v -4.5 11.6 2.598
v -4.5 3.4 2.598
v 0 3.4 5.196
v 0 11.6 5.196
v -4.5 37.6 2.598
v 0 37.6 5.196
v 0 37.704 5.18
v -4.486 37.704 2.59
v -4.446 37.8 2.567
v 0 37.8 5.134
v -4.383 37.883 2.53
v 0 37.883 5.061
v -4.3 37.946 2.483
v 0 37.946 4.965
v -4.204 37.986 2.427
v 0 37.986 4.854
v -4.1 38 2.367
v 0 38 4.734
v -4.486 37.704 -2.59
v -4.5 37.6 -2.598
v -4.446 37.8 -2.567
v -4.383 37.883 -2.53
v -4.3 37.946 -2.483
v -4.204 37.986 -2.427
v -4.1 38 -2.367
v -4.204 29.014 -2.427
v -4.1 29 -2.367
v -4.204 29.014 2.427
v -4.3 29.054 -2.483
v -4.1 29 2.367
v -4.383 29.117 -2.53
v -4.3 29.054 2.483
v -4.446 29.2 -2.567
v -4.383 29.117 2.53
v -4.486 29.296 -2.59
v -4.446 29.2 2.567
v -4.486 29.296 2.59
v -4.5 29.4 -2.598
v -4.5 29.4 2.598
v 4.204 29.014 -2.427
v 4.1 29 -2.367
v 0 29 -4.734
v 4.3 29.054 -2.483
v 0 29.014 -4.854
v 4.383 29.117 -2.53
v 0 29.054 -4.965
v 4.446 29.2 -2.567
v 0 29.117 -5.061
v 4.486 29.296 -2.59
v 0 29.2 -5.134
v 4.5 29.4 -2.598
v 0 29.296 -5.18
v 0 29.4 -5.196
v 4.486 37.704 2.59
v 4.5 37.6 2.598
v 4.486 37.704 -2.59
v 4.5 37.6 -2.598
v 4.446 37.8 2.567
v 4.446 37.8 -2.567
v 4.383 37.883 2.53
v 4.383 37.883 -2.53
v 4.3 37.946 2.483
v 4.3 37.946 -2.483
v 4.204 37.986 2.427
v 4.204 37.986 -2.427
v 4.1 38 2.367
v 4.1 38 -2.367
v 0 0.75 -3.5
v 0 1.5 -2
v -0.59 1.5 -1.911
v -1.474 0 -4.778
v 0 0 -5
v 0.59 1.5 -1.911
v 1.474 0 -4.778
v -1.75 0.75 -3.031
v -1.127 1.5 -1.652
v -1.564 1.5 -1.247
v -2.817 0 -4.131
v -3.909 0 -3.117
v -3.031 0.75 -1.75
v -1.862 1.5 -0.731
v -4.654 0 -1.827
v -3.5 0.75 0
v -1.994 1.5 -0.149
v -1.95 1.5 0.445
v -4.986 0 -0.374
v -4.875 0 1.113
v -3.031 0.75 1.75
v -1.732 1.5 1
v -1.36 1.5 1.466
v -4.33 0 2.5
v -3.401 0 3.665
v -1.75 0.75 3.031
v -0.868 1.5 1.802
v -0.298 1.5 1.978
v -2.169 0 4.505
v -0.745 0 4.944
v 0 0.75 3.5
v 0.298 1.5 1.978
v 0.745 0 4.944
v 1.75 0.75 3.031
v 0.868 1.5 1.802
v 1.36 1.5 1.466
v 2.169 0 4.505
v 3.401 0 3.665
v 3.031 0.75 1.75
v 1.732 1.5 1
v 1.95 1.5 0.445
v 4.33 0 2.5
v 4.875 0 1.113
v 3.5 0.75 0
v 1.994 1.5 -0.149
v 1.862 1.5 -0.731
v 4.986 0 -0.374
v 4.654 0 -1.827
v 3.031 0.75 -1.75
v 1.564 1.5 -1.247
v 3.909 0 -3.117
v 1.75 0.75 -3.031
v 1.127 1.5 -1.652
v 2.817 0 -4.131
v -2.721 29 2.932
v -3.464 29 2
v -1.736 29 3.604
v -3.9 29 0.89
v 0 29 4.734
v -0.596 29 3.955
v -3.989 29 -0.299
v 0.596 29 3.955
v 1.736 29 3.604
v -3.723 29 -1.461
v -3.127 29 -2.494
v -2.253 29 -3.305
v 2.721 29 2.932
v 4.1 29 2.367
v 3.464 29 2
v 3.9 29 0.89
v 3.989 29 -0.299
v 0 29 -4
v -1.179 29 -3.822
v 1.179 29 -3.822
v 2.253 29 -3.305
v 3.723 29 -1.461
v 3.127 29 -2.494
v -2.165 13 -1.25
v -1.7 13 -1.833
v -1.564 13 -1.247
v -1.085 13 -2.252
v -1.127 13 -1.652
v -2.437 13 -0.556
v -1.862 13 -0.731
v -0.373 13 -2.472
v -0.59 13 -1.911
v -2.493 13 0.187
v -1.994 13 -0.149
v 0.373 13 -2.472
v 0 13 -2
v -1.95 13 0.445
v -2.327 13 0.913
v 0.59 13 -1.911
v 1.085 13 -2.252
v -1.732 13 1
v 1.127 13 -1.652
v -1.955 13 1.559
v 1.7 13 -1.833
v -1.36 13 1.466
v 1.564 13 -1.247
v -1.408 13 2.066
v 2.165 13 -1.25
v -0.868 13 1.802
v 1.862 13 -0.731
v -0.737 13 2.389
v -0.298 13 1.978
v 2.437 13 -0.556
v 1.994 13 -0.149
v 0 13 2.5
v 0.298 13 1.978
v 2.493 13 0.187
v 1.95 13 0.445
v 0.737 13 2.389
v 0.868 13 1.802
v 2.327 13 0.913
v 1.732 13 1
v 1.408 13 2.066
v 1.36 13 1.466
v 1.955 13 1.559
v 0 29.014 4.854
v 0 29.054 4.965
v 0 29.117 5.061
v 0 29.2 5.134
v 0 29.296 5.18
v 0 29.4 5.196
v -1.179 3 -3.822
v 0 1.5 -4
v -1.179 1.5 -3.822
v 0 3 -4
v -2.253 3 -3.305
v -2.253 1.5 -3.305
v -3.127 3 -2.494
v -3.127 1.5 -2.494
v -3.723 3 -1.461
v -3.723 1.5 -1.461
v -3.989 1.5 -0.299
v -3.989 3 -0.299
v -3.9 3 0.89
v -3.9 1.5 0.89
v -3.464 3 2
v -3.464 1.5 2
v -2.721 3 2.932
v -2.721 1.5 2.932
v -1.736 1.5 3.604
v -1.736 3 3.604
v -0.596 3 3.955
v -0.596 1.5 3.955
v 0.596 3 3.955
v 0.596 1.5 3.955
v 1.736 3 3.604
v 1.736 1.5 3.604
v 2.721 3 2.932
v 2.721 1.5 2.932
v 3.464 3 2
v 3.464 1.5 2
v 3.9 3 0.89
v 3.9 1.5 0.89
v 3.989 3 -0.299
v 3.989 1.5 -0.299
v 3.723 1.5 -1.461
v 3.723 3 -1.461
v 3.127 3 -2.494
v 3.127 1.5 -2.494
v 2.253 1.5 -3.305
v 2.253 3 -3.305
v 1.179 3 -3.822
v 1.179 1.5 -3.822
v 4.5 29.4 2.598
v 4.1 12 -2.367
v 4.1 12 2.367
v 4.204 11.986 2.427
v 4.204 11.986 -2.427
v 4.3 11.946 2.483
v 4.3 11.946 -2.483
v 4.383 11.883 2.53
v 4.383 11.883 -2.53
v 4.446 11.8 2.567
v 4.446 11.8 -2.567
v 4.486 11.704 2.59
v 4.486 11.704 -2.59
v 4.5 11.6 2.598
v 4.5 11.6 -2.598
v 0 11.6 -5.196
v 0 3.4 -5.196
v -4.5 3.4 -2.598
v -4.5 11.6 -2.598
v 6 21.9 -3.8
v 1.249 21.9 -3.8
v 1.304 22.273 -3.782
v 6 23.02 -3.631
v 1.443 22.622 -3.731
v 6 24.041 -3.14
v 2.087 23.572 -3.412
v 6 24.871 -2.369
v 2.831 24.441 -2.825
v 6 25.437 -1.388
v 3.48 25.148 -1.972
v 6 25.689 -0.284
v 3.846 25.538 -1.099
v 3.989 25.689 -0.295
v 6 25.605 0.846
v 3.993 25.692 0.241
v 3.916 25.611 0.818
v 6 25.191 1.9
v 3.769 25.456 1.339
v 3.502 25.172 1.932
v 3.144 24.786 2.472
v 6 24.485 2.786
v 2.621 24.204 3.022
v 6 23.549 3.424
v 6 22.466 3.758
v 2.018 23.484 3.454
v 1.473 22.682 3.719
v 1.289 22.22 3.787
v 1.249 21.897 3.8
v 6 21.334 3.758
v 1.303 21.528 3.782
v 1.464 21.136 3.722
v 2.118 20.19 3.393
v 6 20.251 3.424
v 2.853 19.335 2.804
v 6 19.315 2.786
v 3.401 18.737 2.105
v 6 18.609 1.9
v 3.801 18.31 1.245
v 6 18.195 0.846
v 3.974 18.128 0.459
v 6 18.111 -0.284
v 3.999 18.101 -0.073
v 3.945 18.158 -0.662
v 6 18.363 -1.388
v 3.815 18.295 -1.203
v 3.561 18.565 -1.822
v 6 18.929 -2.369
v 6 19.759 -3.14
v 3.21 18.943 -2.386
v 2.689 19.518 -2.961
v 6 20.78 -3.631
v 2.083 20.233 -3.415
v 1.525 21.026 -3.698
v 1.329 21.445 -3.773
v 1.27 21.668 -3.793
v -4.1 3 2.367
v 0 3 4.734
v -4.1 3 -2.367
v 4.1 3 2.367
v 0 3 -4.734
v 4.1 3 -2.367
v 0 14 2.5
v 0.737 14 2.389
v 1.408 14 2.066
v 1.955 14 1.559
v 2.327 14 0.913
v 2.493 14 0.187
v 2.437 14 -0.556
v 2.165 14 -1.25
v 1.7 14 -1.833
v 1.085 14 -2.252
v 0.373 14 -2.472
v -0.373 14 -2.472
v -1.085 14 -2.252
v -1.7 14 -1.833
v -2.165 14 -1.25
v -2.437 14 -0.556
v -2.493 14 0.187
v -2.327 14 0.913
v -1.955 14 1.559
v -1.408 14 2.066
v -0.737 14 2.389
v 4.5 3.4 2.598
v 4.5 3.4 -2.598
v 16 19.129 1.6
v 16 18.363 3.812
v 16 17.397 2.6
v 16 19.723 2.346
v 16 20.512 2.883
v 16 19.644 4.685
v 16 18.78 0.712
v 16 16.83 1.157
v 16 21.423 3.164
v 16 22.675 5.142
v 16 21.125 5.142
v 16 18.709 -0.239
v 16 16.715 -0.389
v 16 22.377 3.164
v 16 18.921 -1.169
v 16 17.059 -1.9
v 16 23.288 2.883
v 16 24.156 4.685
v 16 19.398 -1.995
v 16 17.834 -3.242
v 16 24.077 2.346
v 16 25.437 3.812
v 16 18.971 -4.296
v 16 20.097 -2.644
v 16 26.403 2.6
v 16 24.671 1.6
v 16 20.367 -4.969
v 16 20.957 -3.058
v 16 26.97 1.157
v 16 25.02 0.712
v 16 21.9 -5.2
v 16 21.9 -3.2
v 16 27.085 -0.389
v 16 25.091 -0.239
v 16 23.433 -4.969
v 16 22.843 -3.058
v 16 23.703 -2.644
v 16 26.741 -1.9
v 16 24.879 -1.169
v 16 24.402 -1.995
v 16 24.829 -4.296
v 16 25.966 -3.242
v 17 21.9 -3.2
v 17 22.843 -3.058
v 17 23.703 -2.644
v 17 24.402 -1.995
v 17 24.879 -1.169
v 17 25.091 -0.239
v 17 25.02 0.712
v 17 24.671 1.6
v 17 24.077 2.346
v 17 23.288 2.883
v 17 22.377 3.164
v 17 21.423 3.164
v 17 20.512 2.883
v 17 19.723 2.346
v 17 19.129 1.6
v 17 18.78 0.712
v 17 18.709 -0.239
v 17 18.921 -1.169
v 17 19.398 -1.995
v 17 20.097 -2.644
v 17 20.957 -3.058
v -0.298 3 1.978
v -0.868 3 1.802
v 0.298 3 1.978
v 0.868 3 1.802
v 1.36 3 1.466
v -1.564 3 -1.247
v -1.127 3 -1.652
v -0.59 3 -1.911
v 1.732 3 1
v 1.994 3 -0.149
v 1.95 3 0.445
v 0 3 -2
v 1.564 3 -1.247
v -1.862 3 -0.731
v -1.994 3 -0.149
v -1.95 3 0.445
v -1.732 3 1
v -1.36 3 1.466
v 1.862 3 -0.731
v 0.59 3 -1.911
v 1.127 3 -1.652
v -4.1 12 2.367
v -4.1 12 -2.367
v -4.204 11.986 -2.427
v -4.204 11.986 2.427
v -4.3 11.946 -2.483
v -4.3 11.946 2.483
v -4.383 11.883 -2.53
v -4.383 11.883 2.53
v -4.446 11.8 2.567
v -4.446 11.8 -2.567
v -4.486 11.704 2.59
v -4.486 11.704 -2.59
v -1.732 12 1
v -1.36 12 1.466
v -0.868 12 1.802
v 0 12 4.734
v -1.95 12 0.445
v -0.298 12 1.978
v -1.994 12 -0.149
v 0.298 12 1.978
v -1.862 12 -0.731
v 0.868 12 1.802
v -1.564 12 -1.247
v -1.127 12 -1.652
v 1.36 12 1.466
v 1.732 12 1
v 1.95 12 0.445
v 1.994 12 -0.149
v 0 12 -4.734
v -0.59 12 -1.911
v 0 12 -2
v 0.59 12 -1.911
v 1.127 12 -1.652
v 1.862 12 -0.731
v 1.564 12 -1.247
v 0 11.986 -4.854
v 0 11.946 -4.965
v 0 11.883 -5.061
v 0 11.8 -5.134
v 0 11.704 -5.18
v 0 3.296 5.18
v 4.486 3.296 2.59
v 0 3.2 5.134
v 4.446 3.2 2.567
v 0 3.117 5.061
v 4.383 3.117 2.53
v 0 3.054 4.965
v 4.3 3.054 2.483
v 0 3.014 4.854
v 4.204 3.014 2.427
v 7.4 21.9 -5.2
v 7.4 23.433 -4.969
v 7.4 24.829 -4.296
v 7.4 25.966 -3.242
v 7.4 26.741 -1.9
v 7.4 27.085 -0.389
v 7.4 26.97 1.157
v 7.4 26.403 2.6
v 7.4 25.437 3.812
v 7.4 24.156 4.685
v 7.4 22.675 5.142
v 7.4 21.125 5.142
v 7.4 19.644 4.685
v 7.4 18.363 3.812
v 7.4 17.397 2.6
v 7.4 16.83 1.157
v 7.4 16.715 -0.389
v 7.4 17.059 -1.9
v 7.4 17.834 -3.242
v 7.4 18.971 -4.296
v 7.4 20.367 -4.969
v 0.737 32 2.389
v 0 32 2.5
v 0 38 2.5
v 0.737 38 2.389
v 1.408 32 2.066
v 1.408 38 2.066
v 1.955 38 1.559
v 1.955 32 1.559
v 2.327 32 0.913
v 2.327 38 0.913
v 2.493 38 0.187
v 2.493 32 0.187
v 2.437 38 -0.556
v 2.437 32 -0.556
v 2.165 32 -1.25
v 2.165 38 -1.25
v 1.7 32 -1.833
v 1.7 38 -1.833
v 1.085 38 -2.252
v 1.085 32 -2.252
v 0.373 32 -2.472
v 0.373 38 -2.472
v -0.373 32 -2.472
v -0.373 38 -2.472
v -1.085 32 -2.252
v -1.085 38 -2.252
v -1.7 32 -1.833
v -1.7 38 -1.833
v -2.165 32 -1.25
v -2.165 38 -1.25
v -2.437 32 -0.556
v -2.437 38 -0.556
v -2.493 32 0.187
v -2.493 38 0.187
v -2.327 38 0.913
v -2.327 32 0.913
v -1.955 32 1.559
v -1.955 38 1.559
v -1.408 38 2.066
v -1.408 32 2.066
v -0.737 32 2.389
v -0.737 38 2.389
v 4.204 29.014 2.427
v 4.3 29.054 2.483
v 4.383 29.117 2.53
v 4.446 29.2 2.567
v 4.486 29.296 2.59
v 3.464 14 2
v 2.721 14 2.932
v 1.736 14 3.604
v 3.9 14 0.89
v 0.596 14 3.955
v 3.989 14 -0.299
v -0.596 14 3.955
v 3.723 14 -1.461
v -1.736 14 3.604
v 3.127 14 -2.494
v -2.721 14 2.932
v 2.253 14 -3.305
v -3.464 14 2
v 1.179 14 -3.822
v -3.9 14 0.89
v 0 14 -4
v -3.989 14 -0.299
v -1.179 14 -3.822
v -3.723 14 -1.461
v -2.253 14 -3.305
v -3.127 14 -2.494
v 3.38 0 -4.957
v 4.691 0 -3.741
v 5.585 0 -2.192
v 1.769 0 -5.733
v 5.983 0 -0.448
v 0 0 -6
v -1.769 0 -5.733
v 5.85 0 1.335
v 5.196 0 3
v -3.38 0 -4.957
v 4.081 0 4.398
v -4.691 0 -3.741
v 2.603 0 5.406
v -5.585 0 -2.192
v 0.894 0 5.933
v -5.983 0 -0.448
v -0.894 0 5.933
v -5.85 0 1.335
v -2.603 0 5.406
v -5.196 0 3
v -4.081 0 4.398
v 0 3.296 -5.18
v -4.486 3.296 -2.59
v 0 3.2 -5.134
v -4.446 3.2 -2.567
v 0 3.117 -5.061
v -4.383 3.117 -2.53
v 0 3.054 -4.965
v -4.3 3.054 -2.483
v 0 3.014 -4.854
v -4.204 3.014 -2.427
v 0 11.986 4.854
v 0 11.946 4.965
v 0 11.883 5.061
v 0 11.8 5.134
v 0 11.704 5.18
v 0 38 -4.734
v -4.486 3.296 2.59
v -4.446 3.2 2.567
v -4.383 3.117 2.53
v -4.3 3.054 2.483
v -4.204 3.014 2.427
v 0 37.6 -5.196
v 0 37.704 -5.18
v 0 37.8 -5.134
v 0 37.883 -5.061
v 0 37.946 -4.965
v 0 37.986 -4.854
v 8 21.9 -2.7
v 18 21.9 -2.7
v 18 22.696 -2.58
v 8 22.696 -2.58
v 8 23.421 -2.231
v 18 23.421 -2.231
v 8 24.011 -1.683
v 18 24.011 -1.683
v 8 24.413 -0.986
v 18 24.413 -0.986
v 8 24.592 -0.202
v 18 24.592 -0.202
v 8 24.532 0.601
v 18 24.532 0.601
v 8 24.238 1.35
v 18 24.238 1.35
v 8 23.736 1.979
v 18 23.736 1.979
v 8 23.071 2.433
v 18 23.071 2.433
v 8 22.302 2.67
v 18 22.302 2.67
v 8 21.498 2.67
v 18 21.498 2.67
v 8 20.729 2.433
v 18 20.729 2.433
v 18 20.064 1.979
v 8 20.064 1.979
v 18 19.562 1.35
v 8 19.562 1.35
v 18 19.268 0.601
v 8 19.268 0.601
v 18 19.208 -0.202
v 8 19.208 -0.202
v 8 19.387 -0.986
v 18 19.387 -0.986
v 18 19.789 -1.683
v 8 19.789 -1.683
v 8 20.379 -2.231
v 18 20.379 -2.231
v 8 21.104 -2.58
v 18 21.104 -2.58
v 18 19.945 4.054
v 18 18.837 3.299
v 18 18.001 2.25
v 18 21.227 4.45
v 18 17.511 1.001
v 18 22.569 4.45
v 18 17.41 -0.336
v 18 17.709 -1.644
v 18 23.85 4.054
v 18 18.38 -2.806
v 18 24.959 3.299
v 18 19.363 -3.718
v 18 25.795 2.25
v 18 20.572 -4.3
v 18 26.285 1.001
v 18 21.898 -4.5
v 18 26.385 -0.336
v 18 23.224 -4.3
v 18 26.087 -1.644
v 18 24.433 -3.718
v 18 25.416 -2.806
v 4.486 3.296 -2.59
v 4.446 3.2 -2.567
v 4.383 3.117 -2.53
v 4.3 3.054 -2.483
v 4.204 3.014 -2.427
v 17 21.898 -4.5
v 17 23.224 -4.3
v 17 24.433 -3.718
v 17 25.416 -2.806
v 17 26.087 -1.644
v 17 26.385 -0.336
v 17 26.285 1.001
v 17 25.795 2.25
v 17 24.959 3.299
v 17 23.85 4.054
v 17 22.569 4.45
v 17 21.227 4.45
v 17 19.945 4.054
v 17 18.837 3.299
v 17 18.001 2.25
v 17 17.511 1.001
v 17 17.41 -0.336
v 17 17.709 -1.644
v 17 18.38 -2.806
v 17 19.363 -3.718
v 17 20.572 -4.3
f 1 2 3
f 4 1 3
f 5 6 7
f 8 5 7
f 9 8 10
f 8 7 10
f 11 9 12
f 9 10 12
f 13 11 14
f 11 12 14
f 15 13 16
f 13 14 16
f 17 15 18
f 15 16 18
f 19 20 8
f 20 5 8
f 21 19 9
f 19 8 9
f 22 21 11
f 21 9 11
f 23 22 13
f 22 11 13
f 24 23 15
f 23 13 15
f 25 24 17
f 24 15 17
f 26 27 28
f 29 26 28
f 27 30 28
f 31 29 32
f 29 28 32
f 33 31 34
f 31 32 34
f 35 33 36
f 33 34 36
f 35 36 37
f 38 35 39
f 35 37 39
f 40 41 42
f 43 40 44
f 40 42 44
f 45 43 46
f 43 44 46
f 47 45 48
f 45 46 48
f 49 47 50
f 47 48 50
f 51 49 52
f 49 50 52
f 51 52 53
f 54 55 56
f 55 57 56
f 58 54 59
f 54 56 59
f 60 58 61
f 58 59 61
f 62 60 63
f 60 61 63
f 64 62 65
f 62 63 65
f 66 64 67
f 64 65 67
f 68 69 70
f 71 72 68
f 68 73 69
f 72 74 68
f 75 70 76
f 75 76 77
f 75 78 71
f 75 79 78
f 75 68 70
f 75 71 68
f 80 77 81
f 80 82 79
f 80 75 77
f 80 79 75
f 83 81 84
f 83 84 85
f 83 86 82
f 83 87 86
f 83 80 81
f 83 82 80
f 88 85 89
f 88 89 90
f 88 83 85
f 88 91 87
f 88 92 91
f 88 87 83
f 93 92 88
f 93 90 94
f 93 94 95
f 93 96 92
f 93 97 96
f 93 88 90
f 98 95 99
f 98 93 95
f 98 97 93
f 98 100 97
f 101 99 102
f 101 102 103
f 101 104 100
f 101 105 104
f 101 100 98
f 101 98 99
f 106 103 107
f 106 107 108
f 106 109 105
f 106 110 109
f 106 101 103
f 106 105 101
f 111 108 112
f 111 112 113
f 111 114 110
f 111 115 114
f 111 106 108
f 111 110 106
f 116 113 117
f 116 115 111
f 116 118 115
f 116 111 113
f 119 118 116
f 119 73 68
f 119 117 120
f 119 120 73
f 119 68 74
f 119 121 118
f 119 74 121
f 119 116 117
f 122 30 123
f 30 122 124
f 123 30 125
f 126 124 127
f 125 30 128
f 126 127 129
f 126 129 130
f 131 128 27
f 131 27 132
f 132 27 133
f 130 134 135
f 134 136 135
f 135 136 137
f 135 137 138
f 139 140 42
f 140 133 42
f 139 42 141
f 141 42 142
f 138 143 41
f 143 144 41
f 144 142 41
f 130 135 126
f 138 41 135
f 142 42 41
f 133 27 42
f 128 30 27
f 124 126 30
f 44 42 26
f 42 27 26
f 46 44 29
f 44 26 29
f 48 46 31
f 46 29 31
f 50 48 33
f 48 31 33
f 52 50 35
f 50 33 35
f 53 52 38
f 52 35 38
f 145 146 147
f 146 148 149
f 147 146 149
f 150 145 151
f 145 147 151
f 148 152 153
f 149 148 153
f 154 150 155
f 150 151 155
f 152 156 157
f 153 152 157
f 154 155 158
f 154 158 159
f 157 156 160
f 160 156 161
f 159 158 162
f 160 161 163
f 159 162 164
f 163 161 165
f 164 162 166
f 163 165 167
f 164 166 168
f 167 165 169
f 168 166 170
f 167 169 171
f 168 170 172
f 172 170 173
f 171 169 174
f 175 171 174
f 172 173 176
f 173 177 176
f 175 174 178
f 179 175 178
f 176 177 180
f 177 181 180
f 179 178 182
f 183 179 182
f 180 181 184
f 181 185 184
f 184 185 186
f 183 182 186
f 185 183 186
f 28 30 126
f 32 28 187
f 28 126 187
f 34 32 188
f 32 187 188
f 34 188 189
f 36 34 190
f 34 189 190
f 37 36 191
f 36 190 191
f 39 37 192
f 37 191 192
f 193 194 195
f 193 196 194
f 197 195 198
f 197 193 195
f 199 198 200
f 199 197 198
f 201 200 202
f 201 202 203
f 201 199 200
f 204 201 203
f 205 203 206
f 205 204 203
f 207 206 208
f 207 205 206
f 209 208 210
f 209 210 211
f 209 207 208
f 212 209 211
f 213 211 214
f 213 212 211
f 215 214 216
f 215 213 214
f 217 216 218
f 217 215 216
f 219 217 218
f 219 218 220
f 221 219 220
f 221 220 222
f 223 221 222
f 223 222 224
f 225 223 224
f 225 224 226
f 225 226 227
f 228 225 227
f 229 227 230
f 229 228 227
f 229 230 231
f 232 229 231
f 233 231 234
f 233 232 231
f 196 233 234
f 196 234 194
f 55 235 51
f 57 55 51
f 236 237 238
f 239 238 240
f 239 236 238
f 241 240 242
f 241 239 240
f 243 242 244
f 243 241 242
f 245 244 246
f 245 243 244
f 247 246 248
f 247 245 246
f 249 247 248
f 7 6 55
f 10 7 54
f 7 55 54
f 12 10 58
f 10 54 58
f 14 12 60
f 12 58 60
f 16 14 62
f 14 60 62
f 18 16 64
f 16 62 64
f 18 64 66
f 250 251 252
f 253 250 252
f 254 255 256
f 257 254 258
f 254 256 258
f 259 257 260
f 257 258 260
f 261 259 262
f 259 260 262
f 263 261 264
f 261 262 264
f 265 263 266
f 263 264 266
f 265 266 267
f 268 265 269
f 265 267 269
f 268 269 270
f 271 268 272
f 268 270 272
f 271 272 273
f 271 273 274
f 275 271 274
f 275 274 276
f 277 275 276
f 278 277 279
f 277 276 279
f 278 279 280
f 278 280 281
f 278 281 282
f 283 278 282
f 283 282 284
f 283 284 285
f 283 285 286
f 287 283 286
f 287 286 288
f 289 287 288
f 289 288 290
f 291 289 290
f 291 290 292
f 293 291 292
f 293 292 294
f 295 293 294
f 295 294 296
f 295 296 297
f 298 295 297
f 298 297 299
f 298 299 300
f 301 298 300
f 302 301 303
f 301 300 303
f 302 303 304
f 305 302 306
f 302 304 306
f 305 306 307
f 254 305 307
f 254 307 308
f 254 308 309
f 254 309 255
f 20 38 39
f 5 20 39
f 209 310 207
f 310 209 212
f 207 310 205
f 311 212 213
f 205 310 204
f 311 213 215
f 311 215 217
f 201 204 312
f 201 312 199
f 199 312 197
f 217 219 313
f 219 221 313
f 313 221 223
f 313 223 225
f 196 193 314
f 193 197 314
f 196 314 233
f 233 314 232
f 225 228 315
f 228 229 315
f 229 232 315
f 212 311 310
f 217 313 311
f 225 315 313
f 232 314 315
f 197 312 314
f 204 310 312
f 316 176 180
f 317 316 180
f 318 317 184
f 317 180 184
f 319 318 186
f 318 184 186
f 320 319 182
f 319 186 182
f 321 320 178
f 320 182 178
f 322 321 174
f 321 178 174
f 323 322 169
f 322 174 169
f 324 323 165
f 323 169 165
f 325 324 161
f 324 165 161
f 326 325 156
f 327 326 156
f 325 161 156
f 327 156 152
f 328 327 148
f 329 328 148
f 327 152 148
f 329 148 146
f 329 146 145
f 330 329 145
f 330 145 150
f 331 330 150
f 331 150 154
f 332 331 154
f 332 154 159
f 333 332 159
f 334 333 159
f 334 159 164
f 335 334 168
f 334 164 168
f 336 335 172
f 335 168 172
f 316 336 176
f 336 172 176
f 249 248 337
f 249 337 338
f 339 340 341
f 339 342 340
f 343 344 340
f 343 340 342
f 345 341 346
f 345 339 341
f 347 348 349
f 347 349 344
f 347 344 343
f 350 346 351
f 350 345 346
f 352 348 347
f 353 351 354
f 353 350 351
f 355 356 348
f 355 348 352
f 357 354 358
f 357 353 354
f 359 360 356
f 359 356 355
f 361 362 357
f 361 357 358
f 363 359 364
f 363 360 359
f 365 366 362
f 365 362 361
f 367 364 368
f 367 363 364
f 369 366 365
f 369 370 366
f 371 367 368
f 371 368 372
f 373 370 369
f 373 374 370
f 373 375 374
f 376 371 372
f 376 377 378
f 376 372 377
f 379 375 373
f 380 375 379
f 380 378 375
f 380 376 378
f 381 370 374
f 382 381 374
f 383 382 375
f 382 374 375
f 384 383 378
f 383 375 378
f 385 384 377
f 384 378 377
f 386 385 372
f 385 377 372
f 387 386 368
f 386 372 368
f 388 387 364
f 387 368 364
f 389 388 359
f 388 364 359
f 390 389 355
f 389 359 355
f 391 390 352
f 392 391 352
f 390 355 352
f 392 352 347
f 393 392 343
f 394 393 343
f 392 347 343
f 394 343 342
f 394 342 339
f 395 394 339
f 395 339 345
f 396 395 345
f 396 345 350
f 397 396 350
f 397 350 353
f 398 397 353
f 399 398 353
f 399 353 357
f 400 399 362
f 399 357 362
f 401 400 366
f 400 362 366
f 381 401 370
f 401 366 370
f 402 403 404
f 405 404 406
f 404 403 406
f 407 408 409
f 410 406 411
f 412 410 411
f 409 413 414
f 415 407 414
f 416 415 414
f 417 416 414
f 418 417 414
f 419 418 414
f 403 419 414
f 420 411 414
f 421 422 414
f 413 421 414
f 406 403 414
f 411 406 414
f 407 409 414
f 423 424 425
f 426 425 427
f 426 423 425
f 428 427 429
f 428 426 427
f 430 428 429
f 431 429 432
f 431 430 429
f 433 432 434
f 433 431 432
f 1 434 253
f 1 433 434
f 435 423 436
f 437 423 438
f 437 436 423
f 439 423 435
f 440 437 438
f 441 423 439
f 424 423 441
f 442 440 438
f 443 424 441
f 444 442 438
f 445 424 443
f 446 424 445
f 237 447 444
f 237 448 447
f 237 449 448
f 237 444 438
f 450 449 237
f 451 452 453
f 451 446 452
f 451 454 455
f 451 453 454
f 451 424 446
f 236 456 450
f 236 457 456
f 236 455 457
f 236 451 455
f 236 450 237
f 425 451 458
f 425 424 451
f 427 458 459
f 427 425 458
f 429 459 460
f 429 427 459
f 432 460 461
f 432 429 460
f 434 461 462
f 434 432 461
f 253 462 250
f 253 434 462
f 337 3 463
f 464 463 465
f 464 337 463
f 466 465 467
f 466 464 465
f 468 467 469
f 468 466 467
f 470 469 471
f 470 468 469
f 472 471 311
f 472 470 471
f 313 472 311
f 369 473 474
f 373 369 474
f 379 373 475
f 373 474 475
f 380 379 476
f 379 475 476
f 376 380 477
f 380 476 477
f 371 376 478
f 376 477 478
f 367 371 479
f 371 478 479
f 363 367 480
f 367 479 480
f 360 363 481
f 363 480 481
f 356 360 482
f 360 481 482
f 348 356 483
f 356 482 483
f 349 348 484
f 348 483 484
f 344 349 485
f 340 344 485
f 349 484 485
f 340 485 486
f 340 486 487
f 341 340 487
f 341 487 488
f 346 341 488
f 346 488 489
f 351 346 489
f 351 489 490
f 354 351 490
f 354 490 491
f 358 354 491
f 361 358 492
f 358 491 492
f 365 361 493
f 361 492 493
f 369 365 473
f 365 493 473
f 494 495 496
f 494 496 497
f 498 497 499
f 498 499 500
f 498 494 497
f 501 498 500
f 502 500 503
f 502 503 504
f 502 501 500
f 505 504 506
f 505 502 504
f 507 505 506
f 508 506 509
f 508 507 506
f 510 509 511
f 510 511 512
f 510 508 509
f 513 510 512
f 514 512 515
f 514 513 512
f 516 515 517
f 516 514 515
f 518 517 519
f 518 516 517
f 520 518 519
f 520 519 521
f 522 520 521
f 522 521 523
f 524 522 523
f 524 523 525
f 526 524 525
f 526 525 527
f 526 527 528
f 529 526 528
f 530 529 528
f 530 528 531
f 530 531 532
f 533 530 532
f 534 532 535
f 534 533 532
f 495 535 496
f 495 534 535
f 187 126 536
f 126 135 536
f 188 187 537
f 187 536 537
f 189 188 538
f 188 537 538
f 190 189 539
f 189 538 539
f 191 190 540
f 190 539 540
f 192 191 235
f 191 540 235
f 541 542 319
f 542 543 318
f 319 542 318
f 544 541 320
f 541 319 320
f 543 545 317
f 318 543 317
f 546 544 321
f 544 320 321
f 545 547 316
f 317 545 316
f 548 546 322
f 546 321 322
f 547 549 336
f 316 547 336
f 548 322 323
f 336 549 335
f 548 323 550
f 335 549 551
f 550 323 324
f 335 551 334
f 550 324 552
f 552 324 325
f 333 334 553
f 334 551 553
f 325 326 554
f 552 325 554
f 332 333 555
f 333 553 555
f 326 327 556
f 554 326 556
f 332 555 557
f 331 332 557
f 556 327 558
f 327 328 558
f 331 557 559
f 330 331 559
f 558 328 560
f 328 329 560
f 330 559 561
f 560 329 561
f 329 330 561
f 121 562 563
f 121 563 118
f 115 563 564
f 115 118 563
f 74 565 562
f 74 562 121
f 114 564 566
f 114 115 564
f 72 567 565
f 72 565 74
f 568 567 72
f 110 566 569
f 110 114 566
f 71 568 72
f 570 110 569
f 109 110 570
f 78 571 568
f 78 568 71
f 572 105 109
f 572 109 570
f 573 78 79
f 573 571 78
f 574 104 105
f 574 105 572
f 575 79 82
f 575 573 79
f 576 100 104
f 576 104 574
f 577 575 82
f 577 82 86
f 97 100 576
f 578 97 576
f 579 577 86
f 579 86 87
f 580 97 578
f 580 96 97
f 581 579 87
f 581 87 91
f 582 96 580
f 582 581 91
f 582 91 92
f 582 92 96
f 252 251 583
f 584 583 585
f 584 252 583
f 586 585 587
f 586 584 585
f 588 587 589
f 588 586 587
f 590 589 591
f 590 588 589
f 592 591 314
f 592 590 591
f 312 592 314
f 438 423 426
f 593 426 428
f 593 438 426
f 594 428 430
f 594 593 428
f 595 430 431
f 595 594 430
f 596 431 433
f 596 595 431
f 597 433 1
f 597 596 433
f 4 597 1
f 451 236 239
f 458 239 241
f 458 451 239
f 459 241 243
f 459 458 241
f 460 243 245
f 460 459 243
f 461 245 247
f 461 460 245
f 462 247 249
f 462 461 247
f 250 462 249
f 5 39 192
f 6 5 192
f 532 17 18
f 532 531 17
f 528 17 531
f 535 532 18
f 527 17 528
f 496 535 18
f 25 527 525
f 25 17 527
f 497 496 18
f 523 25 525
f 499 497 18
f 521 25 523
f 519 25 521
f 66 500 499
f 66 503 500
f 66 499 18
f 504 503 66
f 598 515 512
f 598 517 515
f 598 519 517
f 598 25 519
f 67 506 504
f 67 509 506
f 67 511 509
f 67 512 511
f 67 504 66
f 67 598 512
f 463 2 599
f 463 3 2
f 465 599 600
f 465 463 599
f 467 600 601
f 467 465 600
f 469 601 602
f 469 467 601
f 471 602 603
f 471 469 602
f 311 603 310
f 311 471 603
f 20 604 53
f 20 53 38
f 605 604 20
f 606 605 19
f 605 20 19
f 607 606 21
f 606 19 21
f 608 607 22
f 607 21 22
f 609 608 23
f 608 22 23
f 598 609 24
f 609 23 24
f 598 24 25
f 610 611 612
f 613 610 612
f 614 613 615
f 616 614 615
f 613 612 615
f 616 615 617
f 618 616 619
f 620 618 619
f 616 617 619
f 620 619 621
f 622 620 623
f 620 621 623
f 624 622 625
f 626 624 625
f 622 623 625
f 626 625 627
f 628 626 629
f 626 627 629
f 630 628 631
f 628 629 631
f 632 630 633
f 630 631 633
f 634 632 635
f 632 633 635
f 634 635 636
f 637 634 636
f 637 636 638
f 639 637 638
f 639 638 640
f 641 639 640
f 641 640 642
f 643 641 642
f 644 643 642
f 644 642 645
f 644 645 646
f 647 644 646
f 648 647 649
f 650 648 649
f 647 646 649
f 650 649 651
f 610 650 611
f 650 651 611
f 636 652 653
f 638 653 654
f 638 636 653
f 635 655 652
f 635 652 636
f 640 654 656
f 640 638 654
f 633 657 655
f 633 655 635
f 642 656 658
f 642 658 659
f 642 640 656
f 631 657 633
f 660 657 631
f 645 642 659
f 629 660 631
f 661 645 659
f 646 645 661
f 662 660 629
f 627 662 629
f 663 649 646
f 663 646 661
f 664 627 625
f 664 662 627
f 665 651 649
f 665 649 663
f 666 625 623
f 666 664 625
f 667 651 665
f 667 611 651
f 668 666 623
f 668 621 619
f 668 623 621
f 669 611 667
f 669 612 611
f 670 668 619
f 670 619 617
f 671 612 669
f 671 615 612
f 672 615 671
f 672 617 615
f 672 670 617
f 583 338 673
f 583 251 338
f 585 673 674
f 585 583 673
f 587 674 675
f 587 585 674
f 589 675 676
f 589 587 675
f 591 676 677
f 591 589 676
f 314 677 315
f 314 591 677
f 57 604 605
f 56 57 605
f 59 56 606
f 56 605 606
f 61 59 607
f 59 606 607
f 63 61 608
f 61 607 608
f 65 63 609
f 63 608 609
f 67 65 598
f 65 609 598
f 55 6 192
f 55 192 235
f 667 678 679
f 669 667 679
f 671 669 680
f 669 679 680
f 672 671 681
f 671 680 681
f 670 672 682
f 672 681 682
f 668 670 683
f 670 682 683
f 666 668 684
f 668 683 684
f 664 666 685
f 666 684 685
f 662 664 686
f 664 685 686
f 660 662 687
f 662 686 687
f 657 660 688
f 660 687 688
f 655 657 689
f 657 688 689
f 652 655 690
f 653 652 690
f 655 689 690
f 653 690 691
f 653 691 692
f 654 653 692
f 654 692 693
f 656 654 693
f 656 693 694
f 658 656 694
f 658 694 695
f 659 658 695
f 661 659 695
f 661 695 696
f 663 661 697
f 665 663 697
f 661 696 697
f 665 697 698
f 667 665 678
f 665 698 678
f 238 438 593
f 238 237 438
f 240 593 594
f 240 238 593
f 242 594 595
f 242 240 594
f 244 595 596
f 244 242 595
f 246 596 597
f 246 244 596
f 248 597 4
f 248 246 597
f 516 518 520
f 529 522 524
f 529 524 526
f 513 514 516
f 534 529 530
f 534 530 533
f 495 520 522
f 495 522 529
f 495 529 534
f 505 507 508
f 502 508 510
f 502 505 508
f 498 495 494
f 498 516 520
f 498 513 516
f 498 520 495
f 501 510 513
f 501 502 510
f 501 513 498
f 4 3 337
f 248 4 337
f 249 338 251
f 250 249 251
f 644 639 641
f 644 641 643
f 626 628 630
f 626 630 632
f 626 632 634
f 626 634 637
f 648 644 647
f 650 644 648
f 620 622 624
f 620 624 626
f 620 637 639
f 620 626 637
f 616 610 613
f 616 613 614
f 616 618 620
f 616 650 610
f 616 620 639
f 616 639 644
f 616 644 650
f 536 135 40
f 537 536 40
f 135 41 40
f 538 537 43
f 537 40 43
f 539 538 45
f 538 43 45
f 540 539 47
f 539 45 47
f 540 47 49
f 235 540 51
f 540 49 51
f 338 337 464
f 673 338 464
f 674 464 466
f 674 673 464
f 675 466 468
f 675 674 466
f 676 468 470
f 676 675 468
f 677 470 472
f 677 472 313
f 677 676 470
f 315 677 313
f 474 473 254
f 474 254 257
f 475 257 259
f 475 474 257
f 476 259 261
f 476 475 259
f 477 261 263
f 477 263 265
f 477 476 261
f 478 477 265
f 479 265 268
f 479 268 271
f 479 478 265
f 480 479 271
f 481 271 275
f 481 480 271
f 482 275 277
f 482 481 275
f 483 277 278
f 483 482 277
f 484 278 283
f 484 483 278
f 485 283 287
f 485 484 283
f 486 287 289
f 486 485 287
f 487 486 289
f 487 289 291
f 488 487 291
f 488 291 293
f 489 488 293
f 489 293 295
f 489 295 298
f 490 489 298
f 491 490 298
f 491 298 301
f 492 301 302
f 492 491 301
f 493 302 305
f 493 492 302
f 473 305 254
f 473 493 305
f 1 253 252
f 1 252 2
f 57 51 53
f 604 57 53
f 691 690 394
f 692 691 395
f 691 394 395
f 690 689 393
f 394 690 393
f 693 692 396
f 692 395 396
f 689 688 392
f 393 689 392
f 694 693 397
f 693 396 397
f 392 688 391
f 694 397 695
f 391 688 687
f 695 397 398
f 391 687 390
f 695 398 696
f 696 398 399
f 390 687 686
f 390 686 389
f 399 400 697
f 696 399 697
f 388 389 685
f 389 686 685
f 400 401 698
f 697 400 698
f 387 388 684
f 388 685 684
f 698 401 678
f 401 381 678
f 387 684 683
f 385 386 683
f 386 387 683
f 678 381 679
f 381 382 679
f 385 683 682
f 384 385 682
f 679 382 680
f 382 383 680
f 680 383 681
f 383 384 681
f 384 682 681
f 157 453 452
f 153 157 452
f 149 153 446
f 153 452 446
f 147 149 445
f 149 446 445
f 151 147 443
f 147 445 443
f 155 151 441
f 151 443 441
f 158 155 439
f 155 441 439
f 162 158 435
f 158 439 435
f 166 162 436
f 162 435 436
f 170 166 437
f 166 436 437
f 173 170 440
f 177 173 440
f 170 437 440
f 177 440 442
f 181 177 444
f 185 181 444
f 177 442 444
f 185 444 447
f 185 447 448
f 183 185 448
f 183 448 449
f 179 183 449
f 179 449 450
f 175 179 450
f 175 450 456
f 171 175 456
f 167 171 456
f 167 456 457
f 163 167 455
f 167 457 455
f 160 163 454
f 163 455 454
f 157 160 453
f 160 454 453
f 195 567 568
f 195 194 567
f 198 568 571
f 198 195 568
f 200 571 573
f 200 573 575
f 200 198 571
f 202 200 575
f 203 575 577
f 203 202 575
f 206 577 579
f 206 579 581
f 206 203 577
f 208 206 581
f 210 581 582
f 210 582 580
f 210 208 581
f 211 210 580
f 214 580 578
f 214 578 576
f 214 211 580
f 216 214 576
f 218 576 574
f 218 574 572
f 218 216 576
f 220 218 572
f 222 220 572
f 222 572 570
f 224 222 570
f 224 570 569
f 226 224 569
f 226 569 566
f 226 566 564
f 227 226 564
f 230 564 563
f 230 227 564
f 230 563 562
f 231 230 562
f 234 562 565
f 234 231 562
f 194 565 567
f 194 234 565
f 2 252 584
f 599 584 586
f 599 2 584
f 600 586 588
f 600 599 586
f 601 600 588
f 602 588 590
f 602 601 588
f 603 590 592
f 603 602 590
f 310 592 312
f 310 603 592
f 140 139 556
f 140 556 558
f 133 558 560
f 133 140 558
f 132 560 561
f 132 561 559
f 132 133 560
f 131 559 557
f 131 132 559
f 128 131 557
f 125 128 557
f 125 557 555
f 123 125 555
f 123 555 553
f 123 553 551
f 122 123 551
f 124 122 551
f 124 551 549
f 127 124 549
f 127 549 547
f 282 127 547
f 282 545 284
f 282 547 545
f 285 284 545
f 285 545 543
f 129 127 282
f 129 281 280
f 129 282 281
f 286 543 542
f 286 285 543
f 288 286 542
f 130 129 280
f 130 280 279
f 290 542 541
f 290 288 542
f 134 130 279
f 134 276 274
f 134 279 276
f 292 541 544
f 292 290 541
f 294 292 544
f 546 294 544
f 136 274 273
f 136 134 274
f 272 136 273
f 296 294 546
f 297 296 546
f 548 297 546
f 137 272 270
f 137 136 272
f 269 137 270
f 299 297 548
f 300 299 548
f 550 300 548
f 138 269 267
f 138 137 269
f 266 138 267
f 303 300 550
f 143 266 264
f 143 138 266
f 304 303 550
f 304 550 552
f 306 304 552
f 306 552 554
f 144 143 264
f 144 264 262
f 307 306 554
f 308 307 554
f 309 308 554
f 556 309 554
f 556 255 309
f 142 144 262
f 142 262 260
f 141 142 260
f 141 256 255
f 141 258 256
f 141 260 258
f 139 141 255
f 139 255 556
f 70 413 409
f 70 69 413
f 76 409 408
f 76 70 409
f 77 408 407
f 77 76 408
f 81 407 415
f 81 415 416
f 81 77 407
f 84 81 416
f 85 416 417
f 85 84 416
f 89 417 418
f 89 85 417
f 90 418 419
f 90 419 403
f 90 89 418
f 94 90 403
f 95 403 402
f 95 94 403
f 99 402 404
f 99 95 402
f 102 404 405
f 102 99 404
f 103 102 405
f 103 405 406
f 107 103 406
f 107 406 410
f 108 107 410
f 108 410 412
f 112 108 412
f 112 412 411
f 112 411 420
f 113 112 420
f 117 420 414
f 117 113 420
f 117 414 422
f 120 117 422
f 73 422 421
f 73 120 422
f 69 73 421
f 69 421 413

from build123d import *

# Parameters (mm, degrees)
BOSS_EXTRU_1_DEPTH      = 9
ESQUISSE3_R             = 2
BOSS_EXTRU_2_DEPTH      = 1
ESQUISSE4_R             = 2.5
BOSS_EXTRU_3_DEPTH      = 1
BOSS_EXTRU_4_START      = 15
ESQUISSE5_R             = 4
BOSS_EXTRU_4_DEPTH      = 15
BOSS_EXTRU_5_DEPTH      = 9
BOSS_EXTRU_6_DEPTH      = 2
BOSS_EXTRU_6_DEPTH_BACK = 4
ESQUISSE7_R             = 3.8
ESQUISSE8_R             = 5.2
BOSS_EXTRU_7_DEPTH      = 10
ESQUISSE9_R             = 3.2
BOSS_EXTRU_8_DEPTH      = 1
ESQUISSE10_R            = 4.5
BOSS_EXTRU_9_DEPTH      = 1
ESQUISSE11_R            = 2.7
ENL_V_MAT_EXTRU_1_DEPTH = 10
ENL_V_START             = -6
ESQUISSE12_R            = 2.5
ENL_V_MAT_EXTRU_2_DEPTH = 6
CONG_1_R                = 0.4
CHANFREIN1_SIZE         = 1.4


with BuildPart() as part:
    # Esquisse1 → Révolution1 (revolve)
    with BuildSketch(Plane.XY, mode=Mode.PRIVATE) as r_volution1_sk:
        Polygon((-5, 0), (-6, 0), (-4, 1.5), (-4, 3), (-2, 3), (-2, 1.5), align=None)
    revolve(r_volution1_sk.sketch.rotate(Axis((0, 0, 0), (0, 1, 0)), 270), axis=Axis((0, 0, 0), (0, 1, 0)))

    # Esquisse2 → Boss.-Extru.1 (add)
    with BuildSketch(Plane(origin=(0, 3, 0), x_dir=(1, 0, 0), z_dir=(0, 1, 0))):
        Polygon((0, -5.196152423), (4.5, -2.598076211), (4.5, 2.598076211), (0, 5.196152423), (-4.5, 2.598076211), (-4.5, -2.598076211), align=None)
    extrude(amount=BOSS_EXTRU_1_DEPTH)

    # Esquisse3 → Boss.-Extru.2 (add)
    with BuildSketch(Plane(origin=(0, 12, 0), x_dir=(1, 0, 0), z_dir=(0, 1, 0))):
        with Locations(Location((0, 0, 0), (0, 0, 90))):
            Circle(ESQUISSE3_R)
    extrude(amount=BOSS_EXTRU_2_DEPTH)

    # Esquisse4 → Boss.-Extru.3 (add)
    with BuildSketch(Plane(origin=(0, 13, 0), x_dir=(1, 0, 0), z_dir=(0, 1, 0))):
        with Locations(Location((0, 0, 0), (0, 0, 270))):
            Circle(ESQUISSE4_R)
    extrude(amount=BOSS_EXTRU_3_DEPTH)

    # Esquisse5 → Boss.-Extru.4 (add)
    with BuildSketch(Plane(origin=(0, 14, 0), x_dir=(1, 0, 0), z_dir=(0, 1, 0)).offset(BOSS_EXTRU_4_START)):
        with Locations(Location((0, 0, 0), (0, 0, 90))):
            Circle(ESQUISSE5_R)
    extrude(amount=-BOSS_EXTRU_4_DEPTH)

    # Esquisse6 → Boss.-Extru.5 (add)
    with BuildSketch(Plane(origin=(0, 29, 0), x_dir=(1, 0, 0), z_dir=(0, 1, 0))):
        Polygon((4.5, -2.598076211), (4.5, 2.598076211), (0, 5.196152423), (-4.5, 2.598076211), (-4.5, -2.598076211), (0, -5.196152423), align=None)
    extrude(amount=BOSS_EXTRU_5_DEPTH)

    # Esquisse7 → Boss.-Extru.6 (add, two sides: drawn at the far end of the back side and taken through both)
    with BuildSketch(Plane(origin=(4, 0, 0), x_dir=(0, 0, -1), z_dir=(1, 0, 0)).offset(-BOSS_EXTRU_6_DEPTH_BACK)):
        with Locations((0, 21.9)):
            Circle(ESQUISSE7_R)
    extrude(amount=BOSS_EXTRU_6_DEPTH + BOSS_EXTRU_6_DEPTH_BACK)

    # Esquisse8 → Boss.-Extru.7 (add)
    with BuildSketch(Plane(origin=(6, 0, 0), x_dir=(0, 0, -1), z_dir=(1, 0, 0))):
        with Locations((0, 21.9)):
            Circle(ESQUISSE8_R)
    extrude(amount=BOSS_EXTRU_7_DEPTH)

    # Esquisse9 → Boss.-Extru.8 (add)
    with BuildSketch(Plane(origin=(16, 0, 0), x_dir=(0, 0, -1), z_dir=(1, 0, 0))):
        with Locations((0, 21.9)):
            Circle(ESQUISSE9_R)
    extrude(amount=BOSS_EXTRU_8_DEPTH)

    # Esquisse10 → Boss.-Extru.9 (add)
    with BuildSketch(Plane(origin=(17, 0, 0), x_dir=(0, 0, -1), z_dir=(1, 0, 0))):
        with Locations((0, 21.89789892)):
            Circle(ESQUISSE10_R)
    extrude(amount=BOSS_EXTRU_9_DEPTH)

    # Esquisse11 → Enlèv. mat.-Extru.1 (cut)
    with BuildSketch(Plane(origin=(18, 0, 0), x_dir=(0, 0, -1), z_dir=(1, 0, 0))):
        with Locations((0, 21.9)):
            Circle(ESQUISSE11_R)
    extrude(amount=-ENL_V_MAT_EXTRU_1_DEPTH, mode=Mode.SUBTRACT)

    # Esquisse12 → Enlèv. mat.-Extru.2 (cut)
    with BuildSketch(Plane(origin=(0, 38, 0), x_dir=(1, 0, 0), z_dir=(0, 1, 0)).offset(ENL_V_START)):
        with Locations(Location((0, 0, 0), (0, 0, 270))):
            Circle(ESQUISSE12_R)
    extrude(amount=ENL_V_MAT_EXTRU_2_DEPTH, mode=Mode.SUBTRACT)

    # Congé1
    cong_1_edges = [part.edges().sort_by_distance(p)[0] for p in [
        (-2.25, 3, 3.897114317),
        (2.25, 3, 3.897114317),
        (4.5, 3, 0),
        (2.25, 3, -3.897114317),
        (-2.25, 3, -3.897114317),
        (-4.5, 3, 0),
        (-2.25, 12, 3.897114317),
        (2.25, 12, 3.897114317),
        (4.5, 12, 0),
        (2.25, 12, -3.897114317),
        (-2.25, 12, -3.897114317),
        (-4.5, 12, 0),
        (2.25, 29, 3.897114317),
        (4.5, 29, 0),
        (2.25, 29, -3.897114317),
        (-2.25, 29, -3.897114317),
        (-4.5, 29, 0),
        (-2.25, 29, 3.897114317),
        (2.25, 38, 3.897114317),
        (4.5, 38, 0),
        (2.25, 38, -3.897114317),
        (-2.25, 38, -3.897114317),
        (-4.5, 38, 0),
        (-2.25, 38, 3.897114317),
    ]]
    fillet(cong_1_edges, radius=CONG_1_R)

    # Chanfrein1
    chanfrein1_edges = [part.edges().sort_by_distance(p)[0] for p in [
        (6, 21.9, 5.2),
    ]]
    chamfer(chanfrein1_edges, length=CHANFREIN1_SIZE - 0.0001)  # a hair under: the kernel refuses the full size


solid = part.part
